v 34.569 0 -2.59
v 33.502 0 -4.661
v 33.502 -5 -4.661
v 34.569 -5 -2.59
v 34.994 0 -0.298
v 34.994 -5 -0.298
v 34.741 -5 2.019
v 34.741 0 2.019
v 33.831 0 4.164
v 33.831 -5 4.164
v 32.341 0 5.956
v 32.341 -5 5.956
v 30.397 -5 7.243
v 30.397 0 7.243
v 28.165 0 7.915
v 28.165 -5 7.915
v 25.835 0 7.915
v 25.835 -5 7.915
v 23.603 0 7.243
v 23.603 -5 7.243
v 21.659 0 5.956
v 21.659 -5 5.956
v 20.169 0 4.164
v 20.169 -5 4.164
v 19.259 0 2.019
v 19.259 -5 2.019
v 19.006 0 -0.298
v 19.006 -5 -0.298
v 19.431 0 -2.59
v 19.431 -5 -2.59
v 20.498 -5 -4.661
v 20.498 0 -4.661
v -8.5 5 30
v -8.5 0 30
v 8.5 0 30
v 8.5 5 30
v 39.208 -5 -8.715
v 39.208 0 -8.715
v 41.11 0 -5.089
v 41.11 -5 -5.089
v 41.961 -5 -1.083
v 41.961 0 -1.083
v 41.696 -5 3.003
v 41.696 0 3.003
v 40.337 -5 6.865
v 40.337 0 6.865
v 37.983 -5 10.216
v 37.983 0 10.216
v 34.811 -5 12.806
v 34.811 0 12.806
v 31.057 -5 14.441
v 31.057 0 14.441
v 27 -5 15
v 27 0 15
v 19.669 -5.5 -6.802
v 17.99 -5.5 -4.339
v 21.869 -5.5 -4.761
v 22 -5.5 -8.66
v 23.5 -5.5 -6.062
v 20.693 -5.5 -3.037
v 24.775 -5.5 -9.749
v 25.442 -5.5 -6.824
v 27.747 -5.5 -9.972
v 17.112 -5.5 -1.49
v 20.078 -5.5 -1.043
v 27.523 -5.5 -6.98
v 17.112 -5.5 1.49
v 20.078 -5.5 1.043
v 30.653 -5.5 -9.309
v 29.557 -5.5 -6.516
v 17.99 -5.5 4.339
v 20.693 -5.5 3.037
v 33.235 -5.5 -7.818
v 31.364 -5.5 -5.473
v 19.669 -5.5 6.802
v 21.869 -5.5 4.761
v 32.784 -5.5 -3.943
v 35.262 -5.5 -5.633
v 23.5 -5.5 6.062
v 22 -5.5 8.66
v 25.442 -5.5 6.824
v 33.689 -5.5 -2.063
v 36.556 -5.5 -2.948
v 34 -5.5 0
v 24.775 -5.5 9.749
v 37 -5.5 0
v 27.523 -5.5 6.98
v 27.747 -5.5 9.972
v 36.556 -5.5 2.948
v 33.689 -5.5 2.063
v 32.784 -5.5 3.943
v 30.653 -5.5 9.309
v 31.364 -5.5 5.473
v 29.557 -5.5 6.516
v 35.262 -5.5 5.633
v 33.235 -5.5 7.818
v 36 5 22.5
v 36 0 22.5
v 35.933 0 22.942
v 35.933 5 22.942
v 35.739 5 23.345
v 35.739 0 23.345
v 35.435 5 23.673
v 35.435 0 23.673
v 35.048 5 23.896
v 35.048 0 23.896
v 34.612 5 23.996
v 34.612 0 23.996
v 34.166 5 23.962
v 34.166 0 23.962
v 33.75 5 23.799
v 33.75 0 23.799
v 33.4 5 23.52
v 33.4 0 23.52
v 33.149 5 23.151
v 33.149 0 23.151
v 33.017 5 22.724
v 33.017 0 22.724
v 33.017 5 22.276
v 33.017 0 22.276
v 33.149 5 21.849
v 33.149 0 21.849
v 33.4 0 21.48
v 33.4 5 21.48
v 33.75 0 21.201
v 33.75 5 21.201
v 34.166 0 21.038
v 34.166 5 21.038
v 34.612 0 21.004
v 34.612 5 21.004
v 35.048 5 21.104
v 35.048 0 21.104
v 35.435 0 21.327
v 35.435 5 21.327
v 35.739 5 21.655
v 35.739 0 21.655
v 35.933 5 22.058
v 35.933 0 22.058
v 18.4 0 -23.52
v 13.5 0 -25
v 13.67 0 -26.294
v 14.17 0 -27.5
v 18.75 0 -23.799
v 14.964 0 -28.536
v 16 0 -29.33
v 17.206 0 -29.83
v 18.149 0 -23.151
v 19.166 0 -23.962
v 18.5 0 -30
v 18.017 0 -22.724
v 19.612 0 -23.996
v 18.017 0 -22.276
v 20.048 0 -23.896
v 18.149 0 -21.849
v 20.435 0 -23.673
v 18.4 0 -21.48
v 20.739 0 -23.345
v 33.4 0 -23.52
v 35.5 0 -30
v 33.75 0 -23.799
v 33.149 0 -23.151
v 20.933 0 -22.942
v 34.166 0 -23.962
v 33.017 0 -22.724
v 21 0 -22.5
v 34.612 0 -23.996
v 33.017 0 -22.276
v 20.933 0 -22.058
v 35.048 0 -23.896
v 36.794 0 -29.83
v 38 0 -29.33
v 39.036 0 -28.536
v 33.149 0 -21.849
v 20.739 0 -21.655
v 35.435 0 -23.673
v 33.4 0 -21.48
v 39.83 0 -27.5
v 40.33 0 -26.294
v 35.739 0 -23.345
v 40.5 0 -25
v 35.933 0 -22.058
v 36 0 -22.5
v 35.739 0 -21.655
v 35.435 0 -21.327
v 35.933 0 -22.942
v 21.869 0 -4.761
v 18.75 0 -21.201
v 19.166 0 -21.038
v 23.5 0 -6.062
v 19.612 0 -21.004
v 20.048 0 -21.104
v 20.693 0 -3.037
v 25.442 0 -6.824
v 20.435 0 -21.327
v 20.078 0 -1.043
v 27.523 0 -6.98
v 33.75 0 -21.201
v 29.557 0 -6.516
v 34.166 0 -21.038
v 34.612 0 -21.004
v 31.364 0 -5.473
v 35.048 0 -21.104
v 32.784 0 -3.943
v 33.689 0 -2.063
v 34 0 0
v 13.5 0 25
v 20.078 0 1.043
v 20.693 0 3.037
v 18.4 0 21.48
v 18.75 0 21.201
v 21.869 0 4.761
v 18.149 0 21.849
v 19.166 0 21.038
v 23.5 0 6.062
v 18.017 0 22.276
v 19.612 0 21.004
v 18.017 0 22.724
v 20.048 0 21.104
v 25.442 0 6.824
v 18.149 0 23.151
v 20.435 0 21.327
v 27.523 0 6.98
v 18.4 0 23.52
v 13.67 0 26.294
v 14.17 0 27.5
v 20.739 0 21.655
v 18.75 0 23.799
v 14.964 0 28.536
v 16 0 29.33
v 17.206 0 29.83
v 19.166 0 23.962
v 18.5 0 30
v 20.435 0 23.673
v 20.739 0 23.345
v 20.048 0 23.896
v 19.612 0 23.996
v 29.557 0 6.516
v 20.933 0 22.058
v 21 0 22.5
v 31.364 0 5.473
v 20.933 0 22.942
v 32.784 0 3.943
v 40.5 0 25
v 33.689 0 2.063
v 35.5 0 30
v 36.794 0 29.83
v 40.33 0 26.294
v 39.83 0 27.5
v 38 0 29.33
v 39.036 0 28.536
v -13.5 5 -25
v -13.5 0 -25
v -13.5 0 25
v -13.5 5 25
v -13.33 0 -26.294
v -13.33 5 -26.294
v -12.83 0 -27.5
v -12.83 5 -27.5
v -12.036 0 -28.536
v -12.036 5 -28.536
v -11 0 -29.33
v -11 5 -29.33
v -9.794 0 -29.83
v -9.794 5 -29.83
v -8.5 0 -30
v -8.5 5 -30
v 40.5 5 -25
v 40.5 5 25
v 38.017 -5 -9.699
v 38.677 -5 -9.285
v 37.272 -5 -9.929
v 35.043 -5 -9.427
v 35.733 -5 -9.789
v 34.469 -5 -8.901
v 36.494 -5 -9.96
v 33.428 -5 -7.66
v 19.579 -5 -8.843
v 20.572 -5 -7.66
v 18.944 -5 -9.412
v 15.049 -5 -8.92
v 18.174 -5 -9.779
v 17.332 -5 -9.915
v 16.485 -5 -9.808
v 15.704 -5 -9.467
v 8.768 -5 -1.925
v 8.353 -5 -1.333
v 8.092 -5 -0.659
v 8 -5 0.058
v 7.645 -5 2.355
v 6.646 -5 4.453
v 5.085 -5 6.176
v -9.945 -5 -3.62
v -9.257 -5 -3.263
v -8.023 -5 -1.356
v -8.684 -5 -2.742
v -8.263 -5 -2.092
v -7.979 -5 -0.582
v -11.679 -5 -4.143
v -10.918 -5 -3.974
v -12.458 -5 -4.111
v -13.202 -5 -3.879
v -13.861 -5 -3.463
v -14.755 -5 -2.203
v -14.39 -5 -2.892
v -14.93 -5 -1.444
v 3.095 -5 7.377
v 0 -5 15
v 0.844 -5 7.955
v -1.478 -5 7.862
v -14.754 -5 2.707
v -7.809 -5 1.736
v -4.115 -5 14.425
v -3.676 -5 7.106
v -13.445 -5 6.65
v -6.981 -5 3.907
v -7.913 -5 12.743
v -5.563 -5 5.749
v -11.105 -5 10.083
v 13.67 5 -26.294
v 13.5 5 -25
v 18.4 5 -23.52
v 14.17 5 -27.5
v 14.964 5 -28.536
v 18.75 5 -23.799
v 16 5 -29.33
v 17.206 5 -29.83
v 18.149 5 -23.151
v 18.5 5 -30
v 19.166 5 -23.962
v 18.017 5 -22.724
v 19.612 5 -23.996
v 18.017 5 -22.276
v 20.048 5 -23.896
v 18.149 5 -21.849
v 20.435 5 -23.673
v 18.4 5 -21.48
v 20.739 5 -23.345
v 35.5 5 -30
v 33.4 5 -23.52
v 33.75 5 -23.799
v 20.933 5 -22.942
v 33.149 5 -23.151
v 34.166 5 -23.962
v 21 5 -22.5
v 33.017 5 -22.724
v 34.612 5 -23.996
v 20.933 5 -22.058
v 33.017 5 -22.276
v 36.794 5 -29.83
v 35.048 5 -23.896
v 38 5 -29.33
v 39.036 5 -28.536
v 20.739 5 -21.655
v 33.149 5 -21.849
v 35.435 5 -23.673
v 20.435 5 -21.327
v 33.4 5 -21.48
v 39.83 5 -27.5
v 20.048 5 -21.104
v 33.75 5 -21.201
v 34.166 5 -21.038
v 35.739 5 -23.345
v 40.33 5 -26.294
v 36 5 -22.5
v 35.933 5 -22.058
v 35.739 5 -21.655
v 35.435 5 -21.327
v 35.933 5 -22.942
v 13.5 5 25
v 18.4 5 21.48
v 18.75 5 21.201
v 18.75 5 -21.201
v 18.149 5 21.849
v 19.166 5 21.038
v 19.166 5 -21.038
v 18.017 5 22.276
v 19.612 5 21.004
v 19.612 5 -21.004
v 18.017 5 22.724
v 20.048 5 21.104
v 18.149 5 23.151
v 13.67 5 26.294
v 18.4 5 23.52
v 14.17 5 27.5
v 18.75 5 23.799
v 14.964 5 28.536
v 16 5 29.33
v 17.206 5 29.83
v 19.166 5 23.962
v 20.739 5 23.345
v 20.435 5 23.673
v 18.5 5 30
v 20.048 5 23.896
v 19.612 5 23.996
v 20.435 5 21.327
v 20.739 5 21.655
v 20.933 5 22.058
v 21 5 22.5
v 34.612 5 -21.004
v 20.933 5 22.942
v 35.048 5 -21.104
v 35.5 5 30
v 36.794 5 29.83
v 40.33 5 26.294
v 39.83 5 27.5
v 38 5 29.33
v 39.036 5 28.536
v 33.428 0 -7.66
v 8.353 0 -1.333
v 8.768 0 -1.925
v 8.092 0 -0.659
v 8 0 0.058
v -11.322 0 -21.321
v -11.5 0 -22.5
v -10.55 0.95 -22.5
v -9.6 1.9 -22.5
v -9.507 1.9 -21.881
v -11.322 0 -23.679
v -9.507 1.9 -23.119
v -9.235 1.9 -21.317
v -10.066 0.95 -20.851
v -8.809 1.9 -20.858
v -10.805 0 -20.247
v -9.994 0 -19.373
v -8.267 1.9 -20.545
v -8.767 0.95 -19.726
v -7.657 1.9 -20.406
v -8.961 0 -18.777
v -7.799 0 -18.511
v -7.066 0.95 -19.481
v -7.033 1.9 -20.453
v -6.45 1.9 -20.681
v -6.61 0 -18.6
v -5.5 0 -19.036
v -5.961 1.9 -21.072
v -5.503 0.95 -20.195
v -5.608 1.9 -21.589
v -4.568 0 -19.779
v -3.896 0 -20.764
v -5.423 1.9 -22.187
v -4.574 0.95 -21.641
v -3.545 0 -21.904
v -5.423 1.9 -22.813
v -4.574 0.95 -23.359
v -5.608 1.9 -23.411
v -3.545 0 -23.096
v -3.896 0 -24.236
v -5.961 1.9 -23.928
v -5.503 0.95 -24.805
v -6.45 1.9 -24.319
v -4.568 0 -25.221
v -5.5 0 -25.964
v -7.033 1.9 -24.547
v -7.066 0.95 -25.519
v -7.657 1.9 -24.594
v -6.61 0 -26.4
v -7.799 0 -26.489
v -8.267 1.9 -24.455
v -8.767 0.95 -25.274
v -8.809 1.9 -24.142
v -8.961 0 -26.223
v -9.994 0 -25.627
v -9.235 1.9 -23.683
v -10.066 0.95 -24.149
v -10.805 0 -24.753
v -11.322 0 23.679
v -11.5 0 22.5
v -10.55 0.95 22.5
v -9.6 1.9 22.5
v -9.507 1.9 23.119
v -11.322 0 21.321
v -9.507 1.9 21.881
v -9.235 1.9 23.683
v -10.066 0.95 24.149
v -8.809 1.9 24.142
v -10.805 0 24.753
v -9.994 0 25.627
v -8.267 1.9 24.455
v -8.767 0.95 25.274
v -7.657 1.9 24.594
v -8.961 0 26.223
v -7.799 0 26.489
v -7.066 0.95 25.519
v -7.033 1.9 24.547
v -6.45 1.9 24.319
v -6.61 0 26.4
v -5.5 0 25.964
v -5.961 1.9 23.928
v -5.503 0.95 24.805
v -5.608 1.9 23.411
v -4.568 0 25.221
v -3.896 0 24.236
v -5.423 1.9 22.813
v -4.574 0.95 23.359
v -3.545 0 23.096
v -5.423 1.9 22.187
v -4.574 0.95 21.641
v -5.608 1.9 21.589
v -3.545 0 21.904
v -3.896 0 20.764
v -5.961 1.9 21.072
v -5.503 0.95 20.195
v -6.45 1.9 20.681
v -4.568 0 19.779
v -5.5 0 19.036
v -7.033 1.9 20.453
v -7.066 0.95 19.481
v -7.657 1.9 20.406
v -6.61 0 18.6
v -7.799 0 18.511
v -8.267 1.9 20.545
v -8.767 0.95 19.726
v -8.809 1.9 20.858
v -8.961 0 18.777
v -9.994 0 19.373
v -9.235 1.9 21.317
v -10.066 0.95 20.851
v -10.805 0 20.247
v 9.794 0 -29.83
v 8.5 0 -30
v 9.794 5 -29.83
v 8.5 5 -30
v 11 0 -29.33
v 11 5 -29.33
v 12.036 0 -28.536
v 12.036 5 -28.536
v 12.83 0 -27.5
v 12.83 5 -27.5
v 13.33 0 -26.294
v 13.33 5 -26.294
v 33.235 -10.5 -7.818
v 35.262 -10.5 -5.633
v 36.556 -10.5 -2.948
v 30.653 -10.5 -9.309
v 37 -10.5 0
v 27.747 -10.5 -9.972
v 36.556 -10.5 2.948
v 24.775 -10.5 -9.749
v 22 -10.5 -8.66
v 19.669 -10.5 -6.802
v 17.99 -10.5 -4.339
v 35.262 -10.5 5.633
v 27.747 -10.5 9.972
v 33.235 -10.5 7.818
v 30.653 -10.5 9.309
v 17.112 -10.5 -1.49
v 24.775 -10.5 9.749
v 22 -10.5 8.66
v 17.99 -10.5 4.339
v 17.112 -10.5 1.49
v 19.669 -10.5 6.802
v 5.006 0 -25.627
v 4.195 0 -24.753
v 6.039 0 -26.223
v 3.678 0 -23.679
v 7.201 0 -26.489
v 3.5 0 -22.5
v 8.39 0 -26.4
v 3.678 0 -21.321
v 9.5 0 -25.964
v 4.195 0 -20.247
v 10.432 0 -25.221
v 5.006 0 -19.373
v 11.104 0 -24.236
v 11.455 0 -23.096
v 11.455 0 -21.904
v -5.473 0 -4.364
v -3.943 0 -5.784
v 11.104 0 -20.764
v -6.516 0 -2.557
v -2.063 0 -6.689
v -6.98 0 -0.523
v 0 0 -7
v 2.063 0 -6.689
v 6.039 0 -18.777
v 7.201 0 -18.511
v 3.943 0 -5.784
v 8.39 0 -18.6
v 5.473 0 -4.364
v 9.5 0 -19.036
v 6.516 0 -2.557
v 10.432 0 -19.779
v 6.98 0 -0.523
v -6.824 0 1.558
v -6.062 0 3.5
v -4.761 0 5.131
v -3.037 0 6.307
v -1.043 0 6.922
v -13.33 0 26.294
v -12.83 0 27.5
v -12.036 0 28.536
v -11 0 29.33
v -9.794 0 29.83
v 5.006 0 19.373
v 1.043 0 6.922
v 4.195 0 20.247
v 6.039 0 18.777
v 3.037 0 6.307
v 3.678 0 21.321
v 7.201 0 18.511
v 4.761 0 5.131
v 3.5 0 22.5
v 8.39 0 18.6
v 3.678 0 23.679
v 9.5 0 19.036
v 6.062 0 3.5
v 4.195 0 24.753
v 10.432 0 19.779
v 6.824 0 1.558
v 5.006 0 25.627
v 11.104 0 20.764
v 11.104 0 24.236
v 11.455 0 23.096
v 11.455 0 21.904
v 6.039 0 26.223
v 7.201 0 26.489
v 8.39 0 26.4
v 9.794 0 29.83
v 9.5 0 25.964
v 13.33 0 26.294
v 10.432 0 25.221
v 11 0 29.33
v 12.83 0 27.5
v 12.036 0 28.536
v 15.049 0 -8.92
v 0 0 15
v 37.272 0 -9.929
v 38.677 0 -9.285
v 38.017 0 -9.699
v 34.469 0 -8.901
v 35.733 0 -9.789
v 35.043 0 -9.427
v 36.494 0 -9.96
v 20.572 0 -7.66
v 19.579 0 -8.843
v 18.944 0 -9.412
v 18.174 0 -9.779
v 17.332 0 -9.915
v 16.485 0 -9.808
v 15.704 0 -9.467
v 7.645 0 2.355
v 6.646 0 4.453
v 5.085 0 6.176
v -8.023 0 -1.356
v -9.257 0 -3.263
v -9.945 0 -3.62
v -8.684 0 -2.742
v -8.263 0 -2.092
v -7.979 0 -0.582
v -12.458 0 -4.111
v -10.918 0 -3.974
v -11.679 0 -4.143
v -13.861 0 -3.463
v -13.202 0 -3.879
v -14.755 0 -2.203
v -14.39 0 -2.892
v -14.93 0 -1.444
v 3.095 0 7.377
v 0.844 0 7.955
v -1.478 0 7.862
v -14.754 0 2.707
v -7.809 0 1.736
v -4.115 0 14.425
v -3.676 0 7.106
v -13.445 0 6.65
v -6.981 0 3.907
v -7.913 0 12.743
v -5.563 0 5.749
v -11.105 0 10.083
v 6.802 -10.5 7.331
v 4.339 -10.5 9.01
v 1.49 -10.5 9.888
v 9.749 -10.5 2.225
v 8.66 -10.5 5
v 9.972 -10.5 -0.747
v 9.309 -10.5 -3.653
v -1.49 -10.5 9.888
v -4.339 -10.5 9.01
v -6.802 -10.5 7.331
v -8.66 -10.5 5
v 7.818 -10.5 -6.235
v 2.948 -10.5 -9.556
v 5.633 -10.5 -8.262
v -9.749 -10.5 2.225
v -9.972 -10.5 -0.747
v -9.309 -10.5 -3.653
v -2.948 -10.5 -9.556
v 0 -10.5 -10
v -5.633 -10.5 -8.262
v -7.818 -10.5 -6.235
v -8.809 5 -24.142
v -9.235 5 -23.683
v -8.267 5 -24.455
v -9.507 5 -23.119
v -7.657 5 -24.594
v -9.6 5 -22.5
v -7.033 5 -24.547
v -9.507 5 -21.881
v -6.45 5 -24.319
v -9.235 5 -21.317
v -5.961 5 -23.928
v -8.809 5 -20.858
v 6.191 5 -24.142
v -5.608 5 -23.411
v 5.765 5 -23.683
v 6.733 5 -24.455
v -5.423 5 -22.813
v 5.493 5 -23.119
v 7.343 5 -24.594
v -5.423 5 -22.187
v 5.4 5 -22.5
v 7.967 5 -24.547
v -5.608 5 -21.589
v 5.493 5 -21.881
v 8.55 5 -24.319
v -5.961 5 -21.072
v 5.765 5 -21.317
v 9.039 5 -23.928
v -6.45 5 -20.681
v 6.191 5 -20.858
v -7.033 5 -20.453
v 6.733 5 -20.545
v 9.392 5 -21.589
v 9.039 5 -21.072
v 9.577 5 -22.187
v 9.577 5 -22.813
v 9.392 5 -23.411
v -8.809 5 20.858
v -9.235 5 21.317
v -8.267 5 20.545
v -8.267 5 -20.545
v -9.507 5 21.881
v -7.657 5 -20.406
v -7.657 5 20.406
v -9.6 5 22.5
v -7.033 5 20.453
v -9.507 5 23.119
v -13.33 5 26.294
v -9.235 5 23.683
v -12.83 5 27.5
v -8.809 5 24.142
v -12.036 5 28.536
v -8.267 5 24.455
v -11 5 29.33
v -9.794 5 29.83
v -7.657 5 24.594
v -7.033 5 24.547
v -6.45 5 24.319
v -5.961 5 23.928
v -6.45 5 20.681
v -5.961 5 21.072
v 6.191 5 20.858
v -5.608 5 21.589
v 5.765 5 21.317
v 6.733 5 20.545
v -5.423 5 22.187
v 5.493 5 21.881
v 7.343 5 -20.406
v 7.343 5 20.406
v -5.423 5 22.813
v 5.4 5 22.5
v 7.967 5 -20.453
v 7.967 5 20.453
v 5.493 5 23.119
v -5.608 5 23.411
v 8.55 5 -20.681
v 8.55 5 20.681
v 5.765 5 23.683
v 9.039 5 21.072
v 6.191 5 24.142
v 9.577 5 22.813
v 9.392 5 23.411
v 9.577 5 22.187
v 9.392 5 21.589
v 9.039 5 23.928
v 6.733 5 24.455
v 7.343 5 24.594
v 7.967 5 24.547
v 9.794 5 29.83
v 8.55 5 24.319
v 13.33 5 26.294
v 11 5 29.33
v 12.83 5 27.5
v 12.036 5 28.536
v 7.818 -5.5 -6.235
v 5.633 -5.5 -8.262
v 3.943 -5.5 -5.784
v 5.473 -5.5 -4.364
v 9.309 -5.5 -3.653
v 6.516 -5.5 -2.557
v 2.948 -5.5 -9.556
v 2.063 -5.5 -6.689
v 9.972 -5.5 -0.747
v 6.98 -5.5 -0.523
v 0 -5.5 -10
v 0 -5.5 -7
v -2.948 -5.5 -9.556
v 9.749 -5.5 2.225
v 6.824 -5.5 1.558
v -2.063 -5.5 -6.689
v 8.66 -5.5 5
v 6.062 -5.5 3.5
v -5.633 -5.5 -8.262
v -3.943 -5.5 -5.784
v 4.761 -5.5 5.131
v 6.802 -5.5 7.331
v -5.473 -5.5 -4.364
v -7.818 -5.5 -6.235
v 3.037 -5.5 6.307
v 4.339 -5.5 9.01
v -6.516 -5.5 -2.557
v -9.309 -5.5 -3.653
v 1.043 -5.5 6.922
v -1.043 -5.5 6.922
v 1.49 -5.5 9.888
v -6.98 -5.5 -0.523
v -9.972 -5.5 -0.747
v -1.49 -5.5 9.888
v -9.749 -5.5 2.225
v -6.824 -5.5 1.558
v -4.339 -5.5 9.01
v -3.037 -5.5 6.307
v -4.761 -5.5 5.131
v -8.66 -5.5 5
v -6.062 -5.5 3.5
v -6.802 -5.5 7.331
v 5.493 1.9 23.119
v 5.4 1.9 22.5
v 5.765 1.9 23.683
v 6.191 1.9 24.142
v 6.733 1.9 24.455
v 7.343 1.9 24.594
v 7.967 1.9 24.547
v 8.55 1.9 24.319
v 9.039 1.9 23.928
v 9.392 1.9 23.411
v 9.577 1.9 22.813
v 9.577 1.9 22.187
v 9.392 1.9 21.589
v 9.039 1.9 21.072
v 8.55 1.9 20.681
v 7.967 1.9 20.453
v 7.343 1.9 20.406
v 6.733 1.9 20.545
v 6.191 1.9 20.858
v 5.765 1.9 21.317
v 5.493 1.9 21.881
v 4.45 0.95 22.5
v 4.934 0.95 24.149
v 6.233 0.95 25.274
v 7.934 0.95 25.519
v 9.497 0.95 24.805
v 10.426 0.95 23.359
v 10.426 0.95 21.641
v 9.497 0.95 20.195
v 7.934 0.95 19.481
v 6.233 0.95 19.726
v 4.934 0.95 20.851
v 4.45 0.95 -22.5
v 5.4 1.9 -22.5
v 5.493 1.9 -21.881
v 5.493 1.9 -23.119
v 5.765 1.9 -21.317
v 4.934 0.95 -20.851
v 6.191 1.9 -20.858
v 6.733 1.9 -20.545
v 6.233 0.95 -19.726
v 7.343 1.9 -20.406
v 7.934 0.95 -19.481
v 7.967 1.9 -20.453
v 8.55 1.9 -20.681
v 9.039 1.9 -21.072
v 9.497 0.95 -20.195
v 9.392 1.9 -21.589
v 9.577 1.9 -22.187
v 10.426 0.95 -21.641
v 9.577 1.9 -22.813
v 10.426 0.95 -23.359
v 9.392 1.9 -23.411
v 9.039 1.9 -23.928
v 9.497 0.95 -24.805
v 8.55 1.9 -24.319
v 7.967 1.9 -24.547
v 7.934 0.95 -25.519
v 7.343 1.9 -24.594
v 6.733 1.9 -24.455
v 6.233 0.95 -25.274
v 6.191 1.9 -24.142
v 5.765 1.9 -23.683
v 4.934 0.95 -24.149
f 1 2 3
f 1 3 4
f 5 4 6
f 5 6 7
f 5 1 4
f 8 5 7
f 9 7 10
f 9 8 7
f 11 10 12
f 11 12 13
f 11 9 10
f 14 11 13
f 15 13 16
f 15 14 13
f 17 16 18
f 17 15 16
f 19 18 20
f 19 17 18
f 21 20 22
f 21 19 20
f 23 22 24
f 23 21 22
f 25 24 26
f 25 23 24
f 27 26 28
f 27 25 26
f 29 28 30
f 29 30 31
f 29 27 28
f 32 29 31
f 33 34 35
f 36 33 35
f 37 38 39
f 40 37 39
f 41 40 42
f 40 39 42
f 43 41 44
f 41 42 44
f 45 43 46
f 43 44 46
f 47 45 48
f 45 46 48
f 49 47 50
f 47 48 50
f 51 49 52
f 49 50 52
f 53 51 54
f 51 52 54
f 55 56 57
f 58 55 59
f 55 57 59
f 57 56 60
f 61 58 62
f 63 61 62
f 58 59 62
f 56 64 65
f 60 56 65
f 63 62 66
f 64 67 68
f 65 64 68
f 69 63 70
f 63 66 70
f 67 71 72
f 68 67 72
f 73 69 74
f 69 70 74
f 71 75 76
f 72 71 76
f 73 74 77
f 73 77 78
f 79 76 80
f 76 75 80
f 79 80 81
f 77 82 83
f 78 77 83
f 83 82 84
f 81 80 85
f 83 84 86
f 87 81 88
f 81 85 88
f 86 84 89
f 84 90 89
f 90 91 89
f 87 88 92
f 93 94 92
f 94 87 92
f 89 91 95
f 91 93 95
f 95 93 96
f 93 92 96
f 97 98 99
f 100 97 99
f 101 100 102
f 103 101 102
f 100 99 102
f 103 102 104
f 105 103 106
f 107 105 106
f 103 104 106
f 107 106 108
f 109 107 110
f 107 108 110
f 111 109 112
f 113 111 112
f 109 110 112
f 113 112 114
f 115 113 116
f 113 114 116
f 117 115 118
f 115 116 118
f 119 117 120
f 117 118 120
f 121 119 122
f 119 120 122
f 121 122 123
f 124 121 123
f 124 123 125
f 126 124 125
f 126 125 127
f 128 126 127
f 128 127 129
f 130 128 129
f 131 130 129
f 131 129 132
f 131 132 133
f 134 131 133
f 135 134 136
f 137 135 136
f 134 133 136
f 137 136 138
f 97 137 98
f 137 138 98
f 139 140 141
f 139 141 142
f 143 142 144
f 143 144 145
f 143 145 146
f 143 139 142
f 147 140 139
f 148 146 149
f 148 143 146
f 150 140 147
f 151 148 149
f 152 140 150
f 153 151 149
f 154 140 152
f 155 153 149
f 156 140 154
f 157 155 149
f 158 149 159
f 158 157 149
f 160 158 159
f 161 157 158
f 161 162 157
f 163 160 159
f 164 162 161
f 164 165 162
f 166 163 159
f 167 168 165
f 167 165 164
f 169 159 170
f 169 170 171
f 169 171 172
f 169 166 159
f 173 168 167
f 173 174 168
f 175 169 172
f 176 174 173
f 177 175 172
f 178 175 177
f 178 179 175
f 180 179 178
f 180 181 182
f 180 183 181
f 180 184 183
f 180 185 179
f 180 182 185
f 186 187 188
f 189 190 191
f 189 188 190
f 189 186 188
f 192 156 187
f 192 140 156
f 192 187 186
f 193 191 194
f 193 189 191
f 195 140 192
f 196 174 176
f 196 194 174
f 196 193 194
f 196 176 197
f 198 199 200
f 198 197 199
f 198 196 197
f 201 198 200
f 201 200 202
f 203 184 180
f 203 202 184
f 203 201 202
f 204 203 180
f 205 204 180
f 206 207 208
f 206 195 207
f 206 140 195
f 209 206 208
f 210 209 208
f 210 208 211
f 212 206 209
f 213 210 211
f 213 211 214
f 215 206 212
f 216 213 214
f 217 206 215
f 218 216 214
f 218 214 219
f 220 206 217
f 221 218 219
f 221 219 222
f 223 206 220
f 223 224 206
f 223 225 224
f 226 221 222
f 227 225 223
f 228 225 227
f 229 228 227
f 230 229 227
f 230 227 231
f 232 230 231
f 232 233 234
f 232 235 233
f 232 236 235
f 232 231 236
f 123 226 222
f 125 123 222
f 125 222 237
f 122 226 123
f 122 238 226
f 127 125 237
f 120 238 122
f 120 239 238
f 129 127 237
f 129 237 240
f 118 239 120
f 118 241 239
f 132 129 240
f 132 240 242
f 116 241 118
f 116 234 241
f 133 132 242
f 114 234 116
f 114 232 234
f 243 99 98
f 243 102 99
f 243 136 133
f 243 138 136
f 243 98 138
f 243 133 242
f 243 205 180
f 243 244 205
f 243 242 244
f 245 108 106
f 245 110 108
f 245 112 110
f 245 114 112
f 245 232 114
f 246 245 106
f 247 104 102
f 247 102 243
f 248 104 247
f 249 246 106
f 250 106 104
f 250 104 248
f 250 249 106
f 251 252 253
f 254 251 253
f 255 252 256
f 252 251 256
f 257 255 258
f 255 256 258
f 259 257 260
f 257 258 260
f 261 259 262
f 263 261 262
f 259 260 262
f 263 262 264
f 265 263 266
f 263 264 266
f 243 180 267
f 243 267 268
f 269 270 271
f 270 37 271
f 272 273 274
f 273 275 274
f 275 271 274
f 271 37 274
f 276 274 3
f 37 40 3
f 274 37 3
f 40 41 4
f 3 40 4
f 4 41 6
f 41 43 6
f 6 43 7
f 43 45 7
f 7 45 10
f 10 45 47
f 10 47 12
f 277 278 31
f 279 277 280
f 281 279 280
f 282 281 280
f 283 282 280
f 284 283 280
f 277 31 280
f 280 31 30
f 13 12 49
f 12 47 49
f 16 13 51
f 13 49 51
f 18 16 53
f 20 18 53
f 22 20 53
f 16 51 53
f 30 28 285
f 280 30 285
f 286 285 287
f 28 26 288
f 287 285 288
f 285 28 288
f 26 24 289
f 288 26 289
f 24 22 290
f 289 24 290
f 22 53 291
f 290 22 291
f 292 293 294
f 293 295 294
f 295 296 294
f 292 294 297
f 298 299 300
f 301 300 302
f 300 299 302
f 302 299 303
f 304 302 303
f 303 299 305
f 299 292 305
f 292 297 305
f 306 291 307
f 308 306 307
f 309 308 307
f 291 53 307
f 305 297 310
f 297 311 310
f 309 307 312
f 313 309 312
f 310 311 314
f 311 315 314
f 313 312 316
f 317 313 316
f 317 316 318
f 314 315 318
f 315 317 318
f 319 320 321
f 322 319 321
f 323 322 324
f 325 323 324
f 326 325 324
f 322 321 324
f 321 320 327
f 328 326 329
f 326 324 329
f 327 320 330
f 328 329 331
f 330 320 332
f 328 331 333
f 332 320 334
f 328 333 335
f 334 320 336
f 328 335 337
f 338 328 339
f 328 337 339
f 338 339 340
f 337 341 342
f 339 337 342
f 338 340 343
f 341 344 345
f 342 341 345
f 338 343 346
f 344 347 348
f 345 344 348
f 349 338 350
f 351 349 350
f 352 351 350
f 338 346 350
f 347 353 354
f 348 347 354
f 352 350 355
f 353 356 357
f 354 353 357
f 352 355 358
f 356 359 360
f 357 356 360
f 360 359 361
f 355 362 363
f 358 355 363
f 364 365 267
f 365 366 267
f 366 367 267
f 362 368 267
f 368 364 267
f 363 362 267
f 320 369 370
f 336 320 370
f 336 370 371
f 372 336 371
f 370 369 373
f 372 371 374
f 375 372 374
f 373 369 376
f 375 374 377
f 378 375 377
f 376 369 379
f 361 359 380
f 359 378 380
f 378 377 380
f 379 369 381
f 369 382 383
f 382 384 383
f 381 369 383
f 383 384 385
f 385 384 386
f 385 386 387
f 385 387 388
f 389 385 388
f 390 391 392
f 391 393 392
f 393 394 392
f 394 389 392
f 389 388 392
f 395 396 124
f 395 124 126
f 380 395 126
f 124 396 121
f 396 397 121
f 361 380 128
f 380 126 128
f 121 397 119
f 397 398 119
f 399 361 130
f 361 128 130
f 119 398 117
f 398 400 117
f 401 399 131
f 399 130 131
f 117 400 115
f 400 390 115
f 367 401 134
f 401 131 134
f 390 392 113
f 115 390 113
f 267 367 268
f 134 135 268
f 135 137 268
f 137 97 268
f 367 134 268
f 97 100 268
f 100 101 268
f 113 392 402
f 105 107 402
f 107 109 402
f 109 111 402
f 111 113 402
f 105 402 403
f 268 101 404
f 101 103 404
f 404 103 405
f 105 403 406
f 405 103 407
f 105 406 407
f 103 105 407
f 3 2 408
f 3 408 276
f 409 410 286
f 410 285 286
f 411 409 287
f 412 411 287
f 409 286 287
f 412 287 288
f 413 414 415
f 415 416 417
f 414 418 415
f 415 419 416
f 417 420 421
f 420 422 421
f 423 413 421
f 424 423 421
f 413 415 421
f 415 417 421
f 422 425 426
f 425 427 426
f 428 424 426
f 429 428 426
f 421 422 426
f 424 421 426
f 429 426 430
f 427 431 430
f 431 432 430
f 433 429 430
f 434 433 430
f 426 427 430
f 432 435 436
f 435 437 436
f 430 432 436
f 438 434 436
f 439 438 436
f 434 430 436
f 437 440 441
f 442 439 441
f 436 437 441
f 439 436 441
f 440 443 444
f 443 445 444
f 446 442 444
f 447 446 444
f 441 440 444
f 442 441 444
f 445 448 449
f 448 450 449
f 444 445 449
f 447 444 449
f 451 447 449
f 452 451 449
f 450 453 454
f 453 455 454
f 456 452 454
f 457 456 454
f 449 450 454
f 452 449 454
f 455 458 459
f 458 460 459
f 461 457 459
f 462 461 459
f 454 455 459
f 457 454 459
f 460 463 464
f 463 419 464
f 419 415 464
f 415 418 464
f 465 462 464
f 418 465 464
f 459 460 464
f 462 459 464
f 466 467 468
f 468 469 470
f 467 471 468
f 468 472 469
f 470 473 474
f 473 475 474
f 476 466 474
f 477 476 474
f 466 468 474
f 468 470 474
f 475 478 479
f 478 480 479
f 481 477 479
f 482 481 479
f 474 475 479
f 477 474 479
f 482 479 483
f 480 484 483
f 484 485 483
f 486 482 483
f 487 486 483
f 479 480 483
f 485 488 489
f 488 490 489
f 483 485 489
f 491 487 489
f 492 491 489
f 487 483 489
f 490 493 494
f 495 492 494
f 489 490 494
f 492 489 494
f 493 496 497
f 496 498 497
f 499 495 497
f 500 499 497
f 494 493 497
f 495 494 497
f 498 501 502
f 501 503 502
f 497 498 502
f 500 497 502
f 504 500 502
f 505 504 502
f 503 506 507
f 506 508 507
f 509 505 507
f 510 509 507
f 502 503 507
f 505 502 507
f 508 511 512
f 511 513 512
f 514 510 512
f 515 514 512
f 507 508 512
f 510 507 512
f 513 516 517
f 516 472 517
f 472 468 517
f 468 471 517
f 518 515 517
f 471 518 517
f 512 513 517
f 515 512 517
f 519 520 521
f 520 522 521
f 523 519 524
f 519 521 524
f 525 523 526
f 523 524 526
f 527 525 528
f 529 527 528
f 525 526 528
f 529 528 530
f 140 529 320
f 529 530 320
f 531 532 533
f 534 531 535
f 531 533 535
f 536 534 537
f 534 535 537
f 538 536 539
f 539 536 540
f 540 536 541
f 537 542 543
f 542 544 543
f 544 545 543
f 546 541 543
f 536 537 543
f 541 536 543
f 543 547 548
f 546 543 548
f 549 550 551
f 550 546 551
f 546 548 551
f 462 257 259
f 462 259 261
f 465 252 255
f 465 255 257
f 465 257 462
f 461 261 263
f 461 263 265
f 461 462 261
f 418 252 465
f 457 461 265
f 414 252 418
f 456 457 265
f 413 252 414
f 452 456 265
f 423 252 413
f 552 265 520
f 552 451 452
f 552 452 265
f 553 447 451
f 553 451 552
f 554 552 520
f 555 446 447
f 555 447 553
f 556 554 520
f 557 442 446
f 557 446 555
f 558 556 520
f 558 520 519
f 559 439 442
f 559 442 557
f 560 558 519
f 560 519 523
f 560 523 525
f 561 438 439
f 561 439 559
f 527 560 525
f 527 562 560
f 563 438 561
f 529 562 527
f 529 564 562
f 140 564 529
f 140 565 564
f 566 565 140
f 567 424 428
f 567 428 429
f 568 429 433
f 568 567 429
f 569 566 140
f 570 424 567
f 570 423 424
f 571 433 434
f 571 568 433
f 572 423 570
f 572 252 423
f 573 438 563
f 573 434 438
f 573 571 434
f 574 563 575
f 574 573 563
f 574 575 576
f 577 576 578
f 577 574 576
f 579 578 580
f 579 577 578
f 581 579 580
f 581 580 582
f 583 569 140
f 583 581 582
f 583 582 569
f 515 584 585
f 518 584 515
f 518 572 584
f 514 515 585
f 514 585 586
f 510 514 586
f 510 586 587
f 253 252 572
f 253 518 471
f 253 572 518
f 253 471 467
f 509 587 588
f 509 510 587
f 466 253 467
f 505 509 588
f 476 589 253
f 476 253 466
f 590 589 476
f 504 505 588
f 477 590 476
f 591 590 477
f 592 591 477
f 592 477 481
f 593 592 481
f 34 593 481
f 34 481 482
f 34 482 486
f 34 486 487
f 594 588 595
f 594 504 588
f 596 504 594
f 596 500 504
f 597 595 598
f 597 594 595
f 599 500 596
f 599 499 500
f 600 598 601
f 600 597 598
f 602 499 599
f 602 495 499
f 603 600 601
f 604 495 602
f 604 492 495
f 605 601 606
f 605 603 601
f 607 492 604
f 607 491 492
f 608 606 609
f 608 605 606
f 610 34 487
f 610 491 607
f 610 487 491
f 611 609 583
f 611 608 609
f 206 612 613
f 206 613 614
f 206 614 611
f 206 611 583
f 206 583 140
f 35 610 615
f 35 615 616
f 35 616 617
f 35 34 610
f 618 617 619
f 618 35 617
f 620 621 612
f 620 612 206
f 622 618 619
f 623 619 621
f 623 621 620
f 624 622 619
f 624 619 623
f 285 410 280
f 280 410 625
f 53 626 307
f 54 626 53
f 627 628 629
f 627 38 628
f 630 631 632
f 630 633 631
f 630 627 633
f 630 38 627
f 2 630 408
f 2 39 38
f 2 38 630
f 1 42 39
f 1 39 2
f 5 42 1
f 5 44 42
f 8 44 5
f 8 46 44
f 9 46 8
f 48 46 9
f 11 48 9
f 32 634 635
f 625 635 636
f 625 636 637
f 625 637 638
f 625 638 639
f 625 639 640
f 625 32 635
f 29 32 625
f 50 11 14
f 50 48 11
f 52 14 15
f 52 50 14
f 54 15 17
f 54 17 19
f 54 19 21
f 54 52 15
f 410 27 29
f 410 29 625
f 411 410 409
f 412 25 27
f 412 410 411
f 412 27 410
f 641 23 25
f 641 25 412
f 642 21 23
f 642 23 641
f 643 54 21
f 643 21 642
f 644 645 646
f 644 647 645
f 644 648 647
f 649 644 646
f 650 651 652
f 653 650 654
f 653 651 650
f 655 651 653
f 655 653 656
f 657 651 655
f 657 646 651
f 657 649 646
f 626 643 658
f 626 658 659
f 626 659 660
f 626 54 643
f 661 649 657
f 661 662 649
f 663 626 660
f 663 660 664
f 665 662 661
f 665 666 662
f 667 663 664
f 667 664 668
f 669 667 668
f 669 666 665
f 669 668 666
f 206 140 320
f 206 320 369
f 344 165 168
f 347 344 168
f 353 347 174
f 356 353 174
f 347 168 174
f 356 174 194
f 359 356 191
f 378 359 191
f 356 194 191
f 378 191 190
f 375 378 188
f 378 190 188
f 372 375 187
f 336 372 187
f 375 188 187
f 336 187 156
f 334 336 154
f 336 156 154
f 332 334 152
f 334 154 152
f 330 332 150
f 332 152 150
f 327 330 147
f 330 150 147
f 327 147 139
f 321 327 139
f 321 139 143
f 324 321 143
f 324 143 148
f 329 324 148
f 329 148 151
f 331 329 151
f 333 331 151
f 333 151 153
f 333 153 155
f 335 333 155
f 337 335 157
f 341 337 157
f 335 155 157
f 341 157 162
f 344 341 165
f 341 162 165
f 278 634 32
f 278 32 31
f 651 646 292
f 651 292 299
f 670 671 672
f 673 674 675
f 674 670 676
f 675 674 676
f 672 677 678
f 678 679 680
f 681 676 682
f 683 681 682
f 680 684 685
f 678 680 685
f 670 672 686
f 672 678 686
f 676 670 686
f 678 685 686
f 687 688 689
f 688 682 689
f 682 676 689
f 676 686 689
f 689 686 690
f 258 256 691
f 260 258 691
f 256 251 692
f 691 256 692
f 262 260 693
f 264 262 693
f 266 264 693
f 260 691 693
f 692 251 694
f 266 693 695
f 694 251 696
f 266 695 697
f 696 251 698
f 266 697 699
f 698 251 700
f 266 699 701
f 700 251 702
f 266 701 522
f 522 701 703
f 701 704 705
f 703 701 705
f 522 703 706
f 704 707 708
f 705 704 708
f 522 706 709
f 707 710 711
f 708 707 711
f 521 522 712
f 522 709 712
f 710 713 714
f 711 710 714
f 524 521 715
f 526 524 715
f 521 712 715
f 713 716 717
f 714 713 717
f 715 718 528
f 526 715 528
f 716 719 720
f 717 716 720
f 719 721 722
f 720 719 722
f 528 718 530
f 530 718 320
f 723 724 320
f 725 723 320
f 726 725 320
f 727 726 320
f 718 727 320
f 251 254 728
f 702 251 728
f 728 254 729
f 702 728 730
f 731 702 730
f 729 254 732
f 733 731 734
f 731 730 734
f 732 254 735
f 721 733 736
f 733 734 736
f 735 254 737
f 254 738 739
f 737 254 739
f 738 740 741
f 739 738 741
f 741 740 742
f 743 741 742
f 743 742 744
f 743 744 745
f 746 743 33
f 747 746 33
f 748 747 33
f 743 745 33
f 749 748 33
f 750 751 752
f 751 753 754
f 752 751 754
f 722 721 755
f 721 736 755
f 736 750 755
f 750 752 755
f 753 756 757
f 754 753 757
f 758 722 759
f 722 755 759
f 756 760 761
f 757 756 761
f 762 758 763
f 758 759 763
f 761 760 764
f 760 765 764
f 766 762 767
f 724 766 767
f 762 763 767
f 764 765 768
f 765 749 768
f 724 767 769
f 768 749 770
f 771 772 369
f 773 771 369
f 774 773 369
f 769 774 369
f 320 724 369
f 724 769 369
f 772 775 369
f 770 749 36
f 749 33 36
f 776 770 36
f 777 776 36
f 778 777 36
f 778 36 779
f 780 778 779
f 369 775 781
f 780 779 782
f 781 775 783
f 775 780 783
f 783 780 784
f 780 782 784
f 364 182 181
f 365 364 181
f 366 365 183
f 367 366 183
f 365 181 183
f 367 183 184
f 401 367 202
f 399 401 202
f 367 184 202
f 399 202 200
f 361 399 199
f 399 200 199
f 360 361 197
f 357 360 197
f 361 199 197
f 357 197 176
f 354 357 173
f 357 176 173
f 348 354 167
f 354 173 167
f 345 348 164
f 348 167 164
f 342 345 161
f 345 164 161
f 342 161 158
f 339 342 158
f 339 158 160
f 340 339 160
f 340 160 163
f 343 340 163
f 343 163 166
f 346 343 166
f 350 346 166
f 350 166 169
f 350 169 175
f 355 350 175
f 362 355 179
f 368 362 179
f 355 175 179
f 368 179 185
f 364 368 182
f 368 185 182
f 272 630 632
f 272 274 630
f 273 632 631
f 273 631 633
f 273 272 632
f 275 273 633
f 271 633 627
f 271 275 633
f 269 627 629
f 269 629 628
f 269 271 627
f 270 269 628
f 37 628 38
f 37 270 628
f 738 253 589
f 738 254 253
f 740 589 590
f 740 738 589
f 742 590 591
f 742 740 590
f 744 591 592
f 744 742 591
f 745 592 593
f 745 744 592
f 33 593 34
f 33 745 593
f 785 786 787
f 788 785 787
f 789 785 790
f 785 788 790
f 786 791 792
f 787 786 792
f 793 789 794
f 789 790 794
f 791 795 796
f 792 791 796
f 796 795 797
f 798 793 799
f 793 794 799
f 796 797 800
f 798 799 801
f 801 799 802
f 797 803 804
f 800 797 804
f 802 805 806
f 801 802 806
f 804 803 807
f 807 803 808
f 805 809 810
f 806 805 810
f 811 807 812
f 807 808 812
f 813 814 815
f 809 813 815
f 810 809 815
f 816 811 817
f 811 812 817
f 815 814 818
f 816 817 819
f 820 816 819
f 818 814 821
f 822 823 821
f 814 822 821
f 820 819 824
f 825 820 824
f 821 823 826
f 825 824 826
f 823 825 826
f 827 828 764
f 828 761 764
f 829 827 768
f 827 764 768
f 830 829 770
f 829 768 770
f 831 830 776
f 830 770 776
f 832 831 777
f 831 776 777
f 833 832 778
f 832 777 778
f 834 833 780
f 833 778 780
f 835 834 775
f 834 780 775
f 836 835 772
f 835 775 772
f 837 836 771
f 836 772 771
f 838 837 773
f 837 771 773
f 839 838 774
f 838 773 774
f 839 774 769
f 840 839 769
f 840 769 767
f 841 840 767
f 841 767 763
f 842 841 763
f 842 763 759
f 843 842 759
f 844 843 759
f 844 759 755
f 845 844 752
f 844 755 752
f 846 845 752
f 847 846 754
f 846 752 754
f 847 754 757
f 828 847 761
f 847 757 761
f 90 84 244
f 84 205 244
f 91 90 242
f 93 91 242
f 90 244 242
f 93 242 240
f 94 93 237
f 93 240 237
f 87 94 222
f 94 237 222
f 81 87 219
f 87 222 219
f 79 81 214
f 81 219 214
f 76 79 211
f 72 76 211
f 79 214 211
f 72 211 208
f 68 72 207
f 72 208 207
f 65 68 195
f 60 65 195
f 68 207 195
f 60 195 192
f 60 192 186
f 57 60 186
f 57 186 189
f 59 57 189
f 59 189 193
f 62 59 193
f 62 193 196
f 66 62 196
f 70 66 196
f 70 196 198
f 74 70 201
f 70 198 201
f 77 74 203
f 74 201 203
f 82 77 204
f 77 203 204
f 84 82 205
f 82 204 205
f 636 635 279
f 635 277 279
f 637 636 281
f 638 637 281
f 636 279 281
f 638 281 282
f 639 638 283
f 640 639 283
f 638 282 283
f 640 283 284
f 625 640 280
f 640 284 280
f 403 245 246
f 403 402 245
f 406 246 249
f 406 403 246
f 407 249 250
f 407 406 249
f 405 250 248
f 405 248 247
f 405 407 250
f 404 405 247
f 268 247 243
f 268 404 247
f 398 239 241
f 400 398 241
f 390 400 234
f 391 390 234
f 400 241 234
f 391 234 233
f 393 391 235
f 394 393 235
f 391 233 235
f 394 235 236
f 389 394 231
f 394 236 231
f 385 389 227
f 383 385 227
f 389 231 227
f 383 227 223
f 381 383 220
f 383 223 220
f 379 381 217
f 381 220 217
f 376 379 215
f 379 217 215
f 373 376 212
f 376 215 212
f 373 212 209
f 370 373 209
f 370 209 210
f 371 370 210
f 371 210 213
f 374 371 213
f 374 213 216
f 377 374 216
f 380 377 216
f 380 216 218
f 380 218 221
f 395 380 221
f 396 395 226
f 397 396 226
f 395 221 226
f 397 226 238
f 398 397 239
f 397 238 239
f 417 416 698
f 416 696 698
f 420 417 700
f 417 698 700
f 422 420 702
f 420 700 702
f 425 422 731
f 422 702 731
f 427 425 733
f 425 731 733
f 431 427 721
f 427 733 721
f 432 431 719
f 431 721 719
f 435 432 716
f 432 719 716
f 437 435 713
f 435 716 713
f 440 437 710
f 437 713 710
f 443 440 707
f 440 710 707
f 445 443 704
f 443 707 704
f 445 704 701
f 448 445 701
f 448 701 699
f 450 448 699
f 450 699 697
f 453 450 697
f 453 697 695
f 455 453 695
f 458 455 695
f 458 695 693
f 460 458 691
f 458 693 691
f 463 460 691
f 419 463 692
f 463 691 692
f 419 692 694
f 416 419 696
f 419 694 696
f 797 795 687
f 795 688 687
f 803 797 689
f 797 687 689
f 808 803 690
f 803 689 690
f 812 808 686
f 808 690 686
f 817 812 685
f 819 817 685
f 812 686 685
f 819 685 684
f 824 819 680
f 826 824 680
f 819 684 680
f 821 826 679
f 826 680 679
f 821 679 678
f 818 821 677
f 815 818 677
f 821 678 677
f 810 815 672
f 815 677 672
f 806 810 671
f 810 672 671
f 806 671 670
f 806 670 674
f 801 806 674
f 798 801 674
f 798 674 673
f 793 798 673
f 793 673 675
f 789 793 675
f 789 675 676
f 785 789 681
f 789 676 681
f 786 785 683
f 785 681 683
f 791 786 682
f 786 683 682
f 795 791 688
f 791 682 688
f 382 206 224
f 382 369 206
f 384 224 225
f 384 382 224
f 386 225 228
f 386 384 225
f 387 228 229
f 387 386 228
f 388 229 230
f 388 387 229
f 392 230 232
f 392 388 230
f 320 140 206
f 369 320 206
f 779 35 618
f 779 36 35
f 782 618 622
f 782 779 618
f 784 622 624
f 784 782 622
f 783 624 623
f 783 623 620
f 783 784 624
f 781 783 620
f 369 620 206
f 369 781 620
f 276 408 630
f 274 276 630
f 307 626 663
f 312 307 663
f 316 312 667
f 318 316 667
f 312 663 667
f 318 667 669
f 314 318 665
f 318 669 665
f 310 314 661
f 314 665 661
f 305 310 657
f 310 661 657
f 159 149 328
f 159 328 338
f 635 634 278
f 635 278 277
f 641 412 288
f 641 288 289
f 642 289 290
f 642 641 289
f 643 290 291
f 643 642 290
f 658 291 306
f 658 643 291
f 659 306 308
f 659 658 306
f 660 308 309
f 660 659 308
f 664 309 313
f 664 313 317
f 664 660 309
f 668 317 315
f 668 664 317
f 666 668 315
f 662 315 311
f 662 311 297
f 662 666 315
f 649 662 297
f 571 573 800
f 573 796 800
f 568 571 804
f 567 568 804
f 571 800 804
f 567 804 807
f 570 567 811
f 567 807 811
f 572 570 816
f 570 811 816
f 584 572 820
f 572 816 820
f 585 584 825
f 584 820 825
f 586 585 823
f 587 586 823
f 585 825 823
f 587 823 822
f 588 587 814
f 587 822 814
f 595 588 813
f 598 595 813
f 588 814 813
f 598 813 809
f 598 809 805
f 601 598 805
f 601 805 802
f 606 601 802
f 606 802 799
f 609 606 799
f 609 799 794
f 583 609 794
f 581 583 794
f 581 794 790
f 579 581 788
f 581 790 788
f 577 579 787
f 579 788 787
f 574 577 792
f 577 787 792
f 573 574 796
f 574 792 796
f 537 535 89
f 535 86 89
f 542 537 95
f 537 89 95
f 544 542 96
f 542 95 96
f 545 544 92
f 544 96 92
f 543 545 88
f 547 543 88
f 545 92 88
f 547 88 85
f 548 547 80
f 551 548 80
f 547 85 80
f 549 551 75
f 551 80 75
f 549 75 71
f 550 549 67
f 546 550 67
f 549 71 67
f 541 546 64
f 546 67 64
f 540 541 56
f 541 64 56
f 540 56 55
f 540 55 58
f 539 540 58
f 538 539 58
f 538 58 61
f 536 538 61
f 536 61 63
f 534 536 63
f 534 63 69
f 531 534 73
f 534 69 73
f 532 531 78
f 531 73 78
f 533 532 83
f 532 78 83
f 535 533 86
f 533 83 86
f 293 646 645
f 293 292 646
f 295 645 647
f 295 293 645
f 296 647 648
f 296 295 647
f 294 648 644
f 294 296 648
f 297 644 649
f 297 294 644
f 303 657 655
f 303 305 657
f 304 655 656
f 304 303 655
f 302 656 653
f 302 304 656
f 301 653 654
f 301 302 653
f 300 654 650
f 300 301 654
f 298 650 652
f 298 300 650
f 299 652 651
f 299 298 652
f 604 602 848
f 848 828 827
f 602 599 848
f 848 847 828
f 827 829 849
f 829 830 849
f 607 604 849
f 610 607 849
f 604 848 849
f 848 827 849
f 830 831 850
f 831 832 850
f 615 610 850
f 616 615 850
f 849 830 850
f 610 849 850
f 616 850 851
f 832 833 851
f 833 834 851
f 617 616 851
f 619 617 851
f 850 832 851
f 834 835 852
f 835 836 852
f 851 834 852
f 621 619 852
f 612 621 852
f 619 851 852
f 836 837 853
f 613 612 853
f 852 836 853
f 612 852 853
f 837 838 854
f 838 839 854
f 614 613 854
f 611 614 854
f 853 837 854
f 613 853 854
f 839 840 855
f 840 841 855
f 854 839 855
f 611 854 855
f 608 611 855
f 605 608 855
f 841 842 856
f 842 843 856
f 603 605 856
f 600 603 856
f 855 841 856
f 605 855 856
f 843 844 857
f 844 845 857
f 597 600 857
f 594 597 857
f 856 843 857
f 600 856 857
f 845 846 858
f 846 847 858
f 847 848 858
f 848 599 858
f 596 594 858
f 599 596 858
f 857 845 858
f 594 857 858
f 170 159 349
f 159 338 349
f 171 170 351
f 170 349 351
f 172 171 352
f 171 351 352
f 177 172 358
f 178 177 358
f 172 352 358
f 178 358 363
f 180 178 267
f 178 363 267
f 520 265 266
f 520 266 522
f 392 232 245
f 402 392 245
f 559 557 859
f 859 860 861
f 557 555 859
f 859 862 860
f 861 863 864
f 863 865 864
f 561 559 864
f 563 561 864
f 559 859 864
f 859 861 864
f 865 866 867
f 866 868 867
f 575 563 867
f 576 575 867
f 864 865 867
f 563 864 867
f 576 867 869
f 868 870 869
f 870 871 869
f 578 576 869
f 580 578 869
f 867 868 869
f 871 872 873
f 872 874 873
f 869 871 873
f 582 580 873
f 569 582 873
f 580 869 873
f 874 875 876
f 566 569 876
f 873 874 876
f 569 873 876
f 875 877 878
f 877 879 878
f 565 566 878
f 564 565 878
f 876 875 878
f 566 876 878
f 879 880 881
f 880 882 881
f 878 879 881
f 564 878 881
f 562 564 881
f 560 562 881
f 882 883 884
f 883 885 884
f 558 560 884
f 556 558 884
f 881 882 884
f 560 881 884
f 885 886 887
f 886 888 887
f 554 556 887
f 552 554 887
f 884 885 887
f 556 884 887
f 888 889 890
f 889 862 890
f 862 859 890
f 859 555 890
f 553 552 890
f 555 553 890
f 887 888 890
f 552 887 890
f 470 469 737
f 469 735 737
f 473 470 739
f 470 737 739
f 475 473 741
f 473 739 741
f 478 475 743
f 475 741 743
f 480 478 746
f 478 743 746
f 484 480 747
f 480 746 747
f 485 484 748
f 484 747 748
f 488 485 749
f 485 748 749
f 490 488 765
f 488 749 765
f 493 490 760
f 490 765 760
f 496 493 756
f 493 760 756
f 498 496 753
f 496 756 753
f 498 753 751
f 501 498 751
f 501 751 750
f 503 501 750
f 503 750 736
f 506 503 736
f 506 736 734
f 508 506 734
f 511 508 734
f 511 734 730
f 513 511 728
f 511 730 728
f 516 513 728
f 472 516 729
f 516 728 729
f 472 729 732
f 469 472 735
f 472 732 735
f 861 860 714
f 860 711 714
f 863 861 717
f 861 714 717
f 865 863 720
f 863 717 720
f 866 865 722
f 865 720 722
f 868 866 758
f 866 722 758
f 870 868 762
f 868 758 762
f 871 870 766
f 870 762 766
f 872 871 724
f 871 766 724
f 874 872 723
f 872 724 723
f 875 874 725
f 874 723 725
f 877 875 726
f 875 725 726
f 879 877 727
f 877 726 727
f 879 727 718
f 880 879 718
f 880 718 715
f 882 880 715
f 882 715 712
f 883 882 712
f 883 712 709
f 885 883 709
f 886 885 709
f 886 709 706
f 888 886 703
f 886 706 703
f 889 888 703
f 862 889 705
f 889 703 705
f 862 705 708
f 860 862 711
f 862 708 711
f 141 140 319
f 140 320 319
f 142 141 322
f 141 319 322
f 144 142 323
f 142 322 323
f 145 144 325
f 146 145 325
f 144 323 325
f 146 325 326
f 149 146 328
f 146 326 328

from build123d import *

# Parameters (mm, degrees)
SKETCH_W         = 27
SKETCH_H         = 60
PAD_DEPTH        = 5
FILLET_R         = 5
HOLE_D           = 4.2
HOLE_DEPTH       = 25
HOLE_CSINK_D     = 8
HOLE_CSINK_ANGLE = 90
SKETCH003_W      = 27
SKETCH003_H      = 60
PAD001_DEPTH     = 5
SKETCH004_R      = 1.5
POCKET001_DEPTH  = 5
FILLET001_R      = 5
PAD002_DEPTH     = 5
CHAMFER_SIZE     = 2
FILLET002_R      = 3


with BuildPart() as body:
    # Sketch → Pad (new body)
    with BuildSketch(Plane.XZ):
        Rectangle(SKETCH_W, SKETCH_H)
    extrude(amount=-PAD_DEPTH)

    # Sketch002 → Revolution (revolve)
    with BuildSketch(Plane.YZ):
        Polygon((0, -7), (-5.5, -7), (-5.5, -10), (-10.5, -10), (-10.5, 0), (0, 0), align=None)
    revolve(axis=Axis((0, 0, 0), (0, 1, 0)))

    # Fillet
    fillet_edges = [body.edges().sort_by_distance(p)[0] for p in [
        (-13.5, 2.5, 30),
        (13.5, 2.5, 30),
        (-13.5, 2.5, -30),
        (13.5, 2.5, -30),
    ]]
    fillet(fillet_edges, radius=FILLET_R)

    # Hole
    with Locations(Plane.XZ):
        with Locations((-7.5, 22.5), (7.5, 22.5), (-7.5, -22.5), (7.5, -22.5)):
            CounterSinkHole(HOLE_D / 2, HOLE_CSINK_D / 2, depth=HOLE_DEPTH, counter_sink_angle=HOLE_CSINK_ANGLE)


with BuildPart() as body001:
    # Sketch003 → Pad001 (new body)
    with BuildSketch(Plane.XZ):
        with Locations((27, 0)):
            Rectangle(SKETCH003_W, SKETCH003_H)
    extrude(amount=-PAD001_DEPTH)

    # Sketch004 → Pocket001 (cut)
    with BuildSketch(Plane.XZ):
        with Locations((19.5, 22.5)):
            Circle(SKETCH004_R)
        with Locations((34.5, 22.5)):
            Circle(SKETCH004_R)
        with Locations((19.5, -22.5)):
            Circle(SKETCH004_R)
        with Locations((34.5, -22.5)):
            Circle(SKETCH004_R)
    extrude(amount=-POCKET001_DEPTH, mode=Mode.SUBTRACT)

    # Sketch005 → Revolution001 (revolve)
    with BuildSketch(Plane.XY):
        Polygon((27, 0), (27, -10.5), (37, -10.5), (37, -5.5), (34, -5.5), (34, 0), align=None)
    revolve(axis=Axis((27, 0, 0), (0, -1, 0)))

    # Fillet001
    fillet001_edges = [body001.edges().sort_by_distance(p)[0] for p in [
        (13.5, 2.5, 30),
        (40.5, 2.5, 30),
        (40.5, 2.5, -30),
        (13.5, 2.5, -30),
    ]]
    fillet(fillet001_edges, radius=FILLET001_R)


with BuildPart() as body002:
    # Sketch006 → Pad002 (new body)
    with BuildSketch(Plane.XZ):
        with BuildLine():
            ThreePointArc((7.937254, -1), (-0.893087, 7.949993), (-7.517541, -2.736161))
            Line((-7.517541, -2.736161), (-14.095389, -5.130302))
            ThreePointArc((0, 15), (-12.287281, 8.603647), (-14.095389, -5.130302))
            Line((0, 15), (27, 15))
            ThreePointArc((36.641814, -11.490667), (41.095389, 5.130302), (27, 15))
            Line((32.142301, -6.128356), (36.641814, -11.490667))
            ThreePointArc((32.142301, -6.128356), (27, 8), (21.857699, -6.128356))
            Line((21.857699, -6.128356), (17.358186, -11.490667))
            Line((7.937254, -1), (17.358186, -11.490667))
        make_face()
    extrude(amount=PAD002_DEPTH)

    # Chamfer
    chamfer_edges = [body002.edges().sort_by_distance(p)[0] for p in [
        (21.857699, -2.5, -6.128356),
        (32.142301, -2.5, -6.128356),
    ]]
    chamfer(chamfer_edges, length=CHAMFER_SIZE)

    # Fillet002
    fillet002_edges = [body002.edges().sort_by_distance(p)[0] for p in [
        (17.358186, -2.5, -11.490667),
        (-14.095389, -2.5, -5.130302),
        (-7.517541, -2.5, -2.736161),
        (36.641814, -2.5, -11.490667),
        (7.937254, -2.5, -1),
    ]]
    fillet(fillet002_edges, radius=FILLET002_R)


solid = Compound([body.part, body001.part, body002.part])
